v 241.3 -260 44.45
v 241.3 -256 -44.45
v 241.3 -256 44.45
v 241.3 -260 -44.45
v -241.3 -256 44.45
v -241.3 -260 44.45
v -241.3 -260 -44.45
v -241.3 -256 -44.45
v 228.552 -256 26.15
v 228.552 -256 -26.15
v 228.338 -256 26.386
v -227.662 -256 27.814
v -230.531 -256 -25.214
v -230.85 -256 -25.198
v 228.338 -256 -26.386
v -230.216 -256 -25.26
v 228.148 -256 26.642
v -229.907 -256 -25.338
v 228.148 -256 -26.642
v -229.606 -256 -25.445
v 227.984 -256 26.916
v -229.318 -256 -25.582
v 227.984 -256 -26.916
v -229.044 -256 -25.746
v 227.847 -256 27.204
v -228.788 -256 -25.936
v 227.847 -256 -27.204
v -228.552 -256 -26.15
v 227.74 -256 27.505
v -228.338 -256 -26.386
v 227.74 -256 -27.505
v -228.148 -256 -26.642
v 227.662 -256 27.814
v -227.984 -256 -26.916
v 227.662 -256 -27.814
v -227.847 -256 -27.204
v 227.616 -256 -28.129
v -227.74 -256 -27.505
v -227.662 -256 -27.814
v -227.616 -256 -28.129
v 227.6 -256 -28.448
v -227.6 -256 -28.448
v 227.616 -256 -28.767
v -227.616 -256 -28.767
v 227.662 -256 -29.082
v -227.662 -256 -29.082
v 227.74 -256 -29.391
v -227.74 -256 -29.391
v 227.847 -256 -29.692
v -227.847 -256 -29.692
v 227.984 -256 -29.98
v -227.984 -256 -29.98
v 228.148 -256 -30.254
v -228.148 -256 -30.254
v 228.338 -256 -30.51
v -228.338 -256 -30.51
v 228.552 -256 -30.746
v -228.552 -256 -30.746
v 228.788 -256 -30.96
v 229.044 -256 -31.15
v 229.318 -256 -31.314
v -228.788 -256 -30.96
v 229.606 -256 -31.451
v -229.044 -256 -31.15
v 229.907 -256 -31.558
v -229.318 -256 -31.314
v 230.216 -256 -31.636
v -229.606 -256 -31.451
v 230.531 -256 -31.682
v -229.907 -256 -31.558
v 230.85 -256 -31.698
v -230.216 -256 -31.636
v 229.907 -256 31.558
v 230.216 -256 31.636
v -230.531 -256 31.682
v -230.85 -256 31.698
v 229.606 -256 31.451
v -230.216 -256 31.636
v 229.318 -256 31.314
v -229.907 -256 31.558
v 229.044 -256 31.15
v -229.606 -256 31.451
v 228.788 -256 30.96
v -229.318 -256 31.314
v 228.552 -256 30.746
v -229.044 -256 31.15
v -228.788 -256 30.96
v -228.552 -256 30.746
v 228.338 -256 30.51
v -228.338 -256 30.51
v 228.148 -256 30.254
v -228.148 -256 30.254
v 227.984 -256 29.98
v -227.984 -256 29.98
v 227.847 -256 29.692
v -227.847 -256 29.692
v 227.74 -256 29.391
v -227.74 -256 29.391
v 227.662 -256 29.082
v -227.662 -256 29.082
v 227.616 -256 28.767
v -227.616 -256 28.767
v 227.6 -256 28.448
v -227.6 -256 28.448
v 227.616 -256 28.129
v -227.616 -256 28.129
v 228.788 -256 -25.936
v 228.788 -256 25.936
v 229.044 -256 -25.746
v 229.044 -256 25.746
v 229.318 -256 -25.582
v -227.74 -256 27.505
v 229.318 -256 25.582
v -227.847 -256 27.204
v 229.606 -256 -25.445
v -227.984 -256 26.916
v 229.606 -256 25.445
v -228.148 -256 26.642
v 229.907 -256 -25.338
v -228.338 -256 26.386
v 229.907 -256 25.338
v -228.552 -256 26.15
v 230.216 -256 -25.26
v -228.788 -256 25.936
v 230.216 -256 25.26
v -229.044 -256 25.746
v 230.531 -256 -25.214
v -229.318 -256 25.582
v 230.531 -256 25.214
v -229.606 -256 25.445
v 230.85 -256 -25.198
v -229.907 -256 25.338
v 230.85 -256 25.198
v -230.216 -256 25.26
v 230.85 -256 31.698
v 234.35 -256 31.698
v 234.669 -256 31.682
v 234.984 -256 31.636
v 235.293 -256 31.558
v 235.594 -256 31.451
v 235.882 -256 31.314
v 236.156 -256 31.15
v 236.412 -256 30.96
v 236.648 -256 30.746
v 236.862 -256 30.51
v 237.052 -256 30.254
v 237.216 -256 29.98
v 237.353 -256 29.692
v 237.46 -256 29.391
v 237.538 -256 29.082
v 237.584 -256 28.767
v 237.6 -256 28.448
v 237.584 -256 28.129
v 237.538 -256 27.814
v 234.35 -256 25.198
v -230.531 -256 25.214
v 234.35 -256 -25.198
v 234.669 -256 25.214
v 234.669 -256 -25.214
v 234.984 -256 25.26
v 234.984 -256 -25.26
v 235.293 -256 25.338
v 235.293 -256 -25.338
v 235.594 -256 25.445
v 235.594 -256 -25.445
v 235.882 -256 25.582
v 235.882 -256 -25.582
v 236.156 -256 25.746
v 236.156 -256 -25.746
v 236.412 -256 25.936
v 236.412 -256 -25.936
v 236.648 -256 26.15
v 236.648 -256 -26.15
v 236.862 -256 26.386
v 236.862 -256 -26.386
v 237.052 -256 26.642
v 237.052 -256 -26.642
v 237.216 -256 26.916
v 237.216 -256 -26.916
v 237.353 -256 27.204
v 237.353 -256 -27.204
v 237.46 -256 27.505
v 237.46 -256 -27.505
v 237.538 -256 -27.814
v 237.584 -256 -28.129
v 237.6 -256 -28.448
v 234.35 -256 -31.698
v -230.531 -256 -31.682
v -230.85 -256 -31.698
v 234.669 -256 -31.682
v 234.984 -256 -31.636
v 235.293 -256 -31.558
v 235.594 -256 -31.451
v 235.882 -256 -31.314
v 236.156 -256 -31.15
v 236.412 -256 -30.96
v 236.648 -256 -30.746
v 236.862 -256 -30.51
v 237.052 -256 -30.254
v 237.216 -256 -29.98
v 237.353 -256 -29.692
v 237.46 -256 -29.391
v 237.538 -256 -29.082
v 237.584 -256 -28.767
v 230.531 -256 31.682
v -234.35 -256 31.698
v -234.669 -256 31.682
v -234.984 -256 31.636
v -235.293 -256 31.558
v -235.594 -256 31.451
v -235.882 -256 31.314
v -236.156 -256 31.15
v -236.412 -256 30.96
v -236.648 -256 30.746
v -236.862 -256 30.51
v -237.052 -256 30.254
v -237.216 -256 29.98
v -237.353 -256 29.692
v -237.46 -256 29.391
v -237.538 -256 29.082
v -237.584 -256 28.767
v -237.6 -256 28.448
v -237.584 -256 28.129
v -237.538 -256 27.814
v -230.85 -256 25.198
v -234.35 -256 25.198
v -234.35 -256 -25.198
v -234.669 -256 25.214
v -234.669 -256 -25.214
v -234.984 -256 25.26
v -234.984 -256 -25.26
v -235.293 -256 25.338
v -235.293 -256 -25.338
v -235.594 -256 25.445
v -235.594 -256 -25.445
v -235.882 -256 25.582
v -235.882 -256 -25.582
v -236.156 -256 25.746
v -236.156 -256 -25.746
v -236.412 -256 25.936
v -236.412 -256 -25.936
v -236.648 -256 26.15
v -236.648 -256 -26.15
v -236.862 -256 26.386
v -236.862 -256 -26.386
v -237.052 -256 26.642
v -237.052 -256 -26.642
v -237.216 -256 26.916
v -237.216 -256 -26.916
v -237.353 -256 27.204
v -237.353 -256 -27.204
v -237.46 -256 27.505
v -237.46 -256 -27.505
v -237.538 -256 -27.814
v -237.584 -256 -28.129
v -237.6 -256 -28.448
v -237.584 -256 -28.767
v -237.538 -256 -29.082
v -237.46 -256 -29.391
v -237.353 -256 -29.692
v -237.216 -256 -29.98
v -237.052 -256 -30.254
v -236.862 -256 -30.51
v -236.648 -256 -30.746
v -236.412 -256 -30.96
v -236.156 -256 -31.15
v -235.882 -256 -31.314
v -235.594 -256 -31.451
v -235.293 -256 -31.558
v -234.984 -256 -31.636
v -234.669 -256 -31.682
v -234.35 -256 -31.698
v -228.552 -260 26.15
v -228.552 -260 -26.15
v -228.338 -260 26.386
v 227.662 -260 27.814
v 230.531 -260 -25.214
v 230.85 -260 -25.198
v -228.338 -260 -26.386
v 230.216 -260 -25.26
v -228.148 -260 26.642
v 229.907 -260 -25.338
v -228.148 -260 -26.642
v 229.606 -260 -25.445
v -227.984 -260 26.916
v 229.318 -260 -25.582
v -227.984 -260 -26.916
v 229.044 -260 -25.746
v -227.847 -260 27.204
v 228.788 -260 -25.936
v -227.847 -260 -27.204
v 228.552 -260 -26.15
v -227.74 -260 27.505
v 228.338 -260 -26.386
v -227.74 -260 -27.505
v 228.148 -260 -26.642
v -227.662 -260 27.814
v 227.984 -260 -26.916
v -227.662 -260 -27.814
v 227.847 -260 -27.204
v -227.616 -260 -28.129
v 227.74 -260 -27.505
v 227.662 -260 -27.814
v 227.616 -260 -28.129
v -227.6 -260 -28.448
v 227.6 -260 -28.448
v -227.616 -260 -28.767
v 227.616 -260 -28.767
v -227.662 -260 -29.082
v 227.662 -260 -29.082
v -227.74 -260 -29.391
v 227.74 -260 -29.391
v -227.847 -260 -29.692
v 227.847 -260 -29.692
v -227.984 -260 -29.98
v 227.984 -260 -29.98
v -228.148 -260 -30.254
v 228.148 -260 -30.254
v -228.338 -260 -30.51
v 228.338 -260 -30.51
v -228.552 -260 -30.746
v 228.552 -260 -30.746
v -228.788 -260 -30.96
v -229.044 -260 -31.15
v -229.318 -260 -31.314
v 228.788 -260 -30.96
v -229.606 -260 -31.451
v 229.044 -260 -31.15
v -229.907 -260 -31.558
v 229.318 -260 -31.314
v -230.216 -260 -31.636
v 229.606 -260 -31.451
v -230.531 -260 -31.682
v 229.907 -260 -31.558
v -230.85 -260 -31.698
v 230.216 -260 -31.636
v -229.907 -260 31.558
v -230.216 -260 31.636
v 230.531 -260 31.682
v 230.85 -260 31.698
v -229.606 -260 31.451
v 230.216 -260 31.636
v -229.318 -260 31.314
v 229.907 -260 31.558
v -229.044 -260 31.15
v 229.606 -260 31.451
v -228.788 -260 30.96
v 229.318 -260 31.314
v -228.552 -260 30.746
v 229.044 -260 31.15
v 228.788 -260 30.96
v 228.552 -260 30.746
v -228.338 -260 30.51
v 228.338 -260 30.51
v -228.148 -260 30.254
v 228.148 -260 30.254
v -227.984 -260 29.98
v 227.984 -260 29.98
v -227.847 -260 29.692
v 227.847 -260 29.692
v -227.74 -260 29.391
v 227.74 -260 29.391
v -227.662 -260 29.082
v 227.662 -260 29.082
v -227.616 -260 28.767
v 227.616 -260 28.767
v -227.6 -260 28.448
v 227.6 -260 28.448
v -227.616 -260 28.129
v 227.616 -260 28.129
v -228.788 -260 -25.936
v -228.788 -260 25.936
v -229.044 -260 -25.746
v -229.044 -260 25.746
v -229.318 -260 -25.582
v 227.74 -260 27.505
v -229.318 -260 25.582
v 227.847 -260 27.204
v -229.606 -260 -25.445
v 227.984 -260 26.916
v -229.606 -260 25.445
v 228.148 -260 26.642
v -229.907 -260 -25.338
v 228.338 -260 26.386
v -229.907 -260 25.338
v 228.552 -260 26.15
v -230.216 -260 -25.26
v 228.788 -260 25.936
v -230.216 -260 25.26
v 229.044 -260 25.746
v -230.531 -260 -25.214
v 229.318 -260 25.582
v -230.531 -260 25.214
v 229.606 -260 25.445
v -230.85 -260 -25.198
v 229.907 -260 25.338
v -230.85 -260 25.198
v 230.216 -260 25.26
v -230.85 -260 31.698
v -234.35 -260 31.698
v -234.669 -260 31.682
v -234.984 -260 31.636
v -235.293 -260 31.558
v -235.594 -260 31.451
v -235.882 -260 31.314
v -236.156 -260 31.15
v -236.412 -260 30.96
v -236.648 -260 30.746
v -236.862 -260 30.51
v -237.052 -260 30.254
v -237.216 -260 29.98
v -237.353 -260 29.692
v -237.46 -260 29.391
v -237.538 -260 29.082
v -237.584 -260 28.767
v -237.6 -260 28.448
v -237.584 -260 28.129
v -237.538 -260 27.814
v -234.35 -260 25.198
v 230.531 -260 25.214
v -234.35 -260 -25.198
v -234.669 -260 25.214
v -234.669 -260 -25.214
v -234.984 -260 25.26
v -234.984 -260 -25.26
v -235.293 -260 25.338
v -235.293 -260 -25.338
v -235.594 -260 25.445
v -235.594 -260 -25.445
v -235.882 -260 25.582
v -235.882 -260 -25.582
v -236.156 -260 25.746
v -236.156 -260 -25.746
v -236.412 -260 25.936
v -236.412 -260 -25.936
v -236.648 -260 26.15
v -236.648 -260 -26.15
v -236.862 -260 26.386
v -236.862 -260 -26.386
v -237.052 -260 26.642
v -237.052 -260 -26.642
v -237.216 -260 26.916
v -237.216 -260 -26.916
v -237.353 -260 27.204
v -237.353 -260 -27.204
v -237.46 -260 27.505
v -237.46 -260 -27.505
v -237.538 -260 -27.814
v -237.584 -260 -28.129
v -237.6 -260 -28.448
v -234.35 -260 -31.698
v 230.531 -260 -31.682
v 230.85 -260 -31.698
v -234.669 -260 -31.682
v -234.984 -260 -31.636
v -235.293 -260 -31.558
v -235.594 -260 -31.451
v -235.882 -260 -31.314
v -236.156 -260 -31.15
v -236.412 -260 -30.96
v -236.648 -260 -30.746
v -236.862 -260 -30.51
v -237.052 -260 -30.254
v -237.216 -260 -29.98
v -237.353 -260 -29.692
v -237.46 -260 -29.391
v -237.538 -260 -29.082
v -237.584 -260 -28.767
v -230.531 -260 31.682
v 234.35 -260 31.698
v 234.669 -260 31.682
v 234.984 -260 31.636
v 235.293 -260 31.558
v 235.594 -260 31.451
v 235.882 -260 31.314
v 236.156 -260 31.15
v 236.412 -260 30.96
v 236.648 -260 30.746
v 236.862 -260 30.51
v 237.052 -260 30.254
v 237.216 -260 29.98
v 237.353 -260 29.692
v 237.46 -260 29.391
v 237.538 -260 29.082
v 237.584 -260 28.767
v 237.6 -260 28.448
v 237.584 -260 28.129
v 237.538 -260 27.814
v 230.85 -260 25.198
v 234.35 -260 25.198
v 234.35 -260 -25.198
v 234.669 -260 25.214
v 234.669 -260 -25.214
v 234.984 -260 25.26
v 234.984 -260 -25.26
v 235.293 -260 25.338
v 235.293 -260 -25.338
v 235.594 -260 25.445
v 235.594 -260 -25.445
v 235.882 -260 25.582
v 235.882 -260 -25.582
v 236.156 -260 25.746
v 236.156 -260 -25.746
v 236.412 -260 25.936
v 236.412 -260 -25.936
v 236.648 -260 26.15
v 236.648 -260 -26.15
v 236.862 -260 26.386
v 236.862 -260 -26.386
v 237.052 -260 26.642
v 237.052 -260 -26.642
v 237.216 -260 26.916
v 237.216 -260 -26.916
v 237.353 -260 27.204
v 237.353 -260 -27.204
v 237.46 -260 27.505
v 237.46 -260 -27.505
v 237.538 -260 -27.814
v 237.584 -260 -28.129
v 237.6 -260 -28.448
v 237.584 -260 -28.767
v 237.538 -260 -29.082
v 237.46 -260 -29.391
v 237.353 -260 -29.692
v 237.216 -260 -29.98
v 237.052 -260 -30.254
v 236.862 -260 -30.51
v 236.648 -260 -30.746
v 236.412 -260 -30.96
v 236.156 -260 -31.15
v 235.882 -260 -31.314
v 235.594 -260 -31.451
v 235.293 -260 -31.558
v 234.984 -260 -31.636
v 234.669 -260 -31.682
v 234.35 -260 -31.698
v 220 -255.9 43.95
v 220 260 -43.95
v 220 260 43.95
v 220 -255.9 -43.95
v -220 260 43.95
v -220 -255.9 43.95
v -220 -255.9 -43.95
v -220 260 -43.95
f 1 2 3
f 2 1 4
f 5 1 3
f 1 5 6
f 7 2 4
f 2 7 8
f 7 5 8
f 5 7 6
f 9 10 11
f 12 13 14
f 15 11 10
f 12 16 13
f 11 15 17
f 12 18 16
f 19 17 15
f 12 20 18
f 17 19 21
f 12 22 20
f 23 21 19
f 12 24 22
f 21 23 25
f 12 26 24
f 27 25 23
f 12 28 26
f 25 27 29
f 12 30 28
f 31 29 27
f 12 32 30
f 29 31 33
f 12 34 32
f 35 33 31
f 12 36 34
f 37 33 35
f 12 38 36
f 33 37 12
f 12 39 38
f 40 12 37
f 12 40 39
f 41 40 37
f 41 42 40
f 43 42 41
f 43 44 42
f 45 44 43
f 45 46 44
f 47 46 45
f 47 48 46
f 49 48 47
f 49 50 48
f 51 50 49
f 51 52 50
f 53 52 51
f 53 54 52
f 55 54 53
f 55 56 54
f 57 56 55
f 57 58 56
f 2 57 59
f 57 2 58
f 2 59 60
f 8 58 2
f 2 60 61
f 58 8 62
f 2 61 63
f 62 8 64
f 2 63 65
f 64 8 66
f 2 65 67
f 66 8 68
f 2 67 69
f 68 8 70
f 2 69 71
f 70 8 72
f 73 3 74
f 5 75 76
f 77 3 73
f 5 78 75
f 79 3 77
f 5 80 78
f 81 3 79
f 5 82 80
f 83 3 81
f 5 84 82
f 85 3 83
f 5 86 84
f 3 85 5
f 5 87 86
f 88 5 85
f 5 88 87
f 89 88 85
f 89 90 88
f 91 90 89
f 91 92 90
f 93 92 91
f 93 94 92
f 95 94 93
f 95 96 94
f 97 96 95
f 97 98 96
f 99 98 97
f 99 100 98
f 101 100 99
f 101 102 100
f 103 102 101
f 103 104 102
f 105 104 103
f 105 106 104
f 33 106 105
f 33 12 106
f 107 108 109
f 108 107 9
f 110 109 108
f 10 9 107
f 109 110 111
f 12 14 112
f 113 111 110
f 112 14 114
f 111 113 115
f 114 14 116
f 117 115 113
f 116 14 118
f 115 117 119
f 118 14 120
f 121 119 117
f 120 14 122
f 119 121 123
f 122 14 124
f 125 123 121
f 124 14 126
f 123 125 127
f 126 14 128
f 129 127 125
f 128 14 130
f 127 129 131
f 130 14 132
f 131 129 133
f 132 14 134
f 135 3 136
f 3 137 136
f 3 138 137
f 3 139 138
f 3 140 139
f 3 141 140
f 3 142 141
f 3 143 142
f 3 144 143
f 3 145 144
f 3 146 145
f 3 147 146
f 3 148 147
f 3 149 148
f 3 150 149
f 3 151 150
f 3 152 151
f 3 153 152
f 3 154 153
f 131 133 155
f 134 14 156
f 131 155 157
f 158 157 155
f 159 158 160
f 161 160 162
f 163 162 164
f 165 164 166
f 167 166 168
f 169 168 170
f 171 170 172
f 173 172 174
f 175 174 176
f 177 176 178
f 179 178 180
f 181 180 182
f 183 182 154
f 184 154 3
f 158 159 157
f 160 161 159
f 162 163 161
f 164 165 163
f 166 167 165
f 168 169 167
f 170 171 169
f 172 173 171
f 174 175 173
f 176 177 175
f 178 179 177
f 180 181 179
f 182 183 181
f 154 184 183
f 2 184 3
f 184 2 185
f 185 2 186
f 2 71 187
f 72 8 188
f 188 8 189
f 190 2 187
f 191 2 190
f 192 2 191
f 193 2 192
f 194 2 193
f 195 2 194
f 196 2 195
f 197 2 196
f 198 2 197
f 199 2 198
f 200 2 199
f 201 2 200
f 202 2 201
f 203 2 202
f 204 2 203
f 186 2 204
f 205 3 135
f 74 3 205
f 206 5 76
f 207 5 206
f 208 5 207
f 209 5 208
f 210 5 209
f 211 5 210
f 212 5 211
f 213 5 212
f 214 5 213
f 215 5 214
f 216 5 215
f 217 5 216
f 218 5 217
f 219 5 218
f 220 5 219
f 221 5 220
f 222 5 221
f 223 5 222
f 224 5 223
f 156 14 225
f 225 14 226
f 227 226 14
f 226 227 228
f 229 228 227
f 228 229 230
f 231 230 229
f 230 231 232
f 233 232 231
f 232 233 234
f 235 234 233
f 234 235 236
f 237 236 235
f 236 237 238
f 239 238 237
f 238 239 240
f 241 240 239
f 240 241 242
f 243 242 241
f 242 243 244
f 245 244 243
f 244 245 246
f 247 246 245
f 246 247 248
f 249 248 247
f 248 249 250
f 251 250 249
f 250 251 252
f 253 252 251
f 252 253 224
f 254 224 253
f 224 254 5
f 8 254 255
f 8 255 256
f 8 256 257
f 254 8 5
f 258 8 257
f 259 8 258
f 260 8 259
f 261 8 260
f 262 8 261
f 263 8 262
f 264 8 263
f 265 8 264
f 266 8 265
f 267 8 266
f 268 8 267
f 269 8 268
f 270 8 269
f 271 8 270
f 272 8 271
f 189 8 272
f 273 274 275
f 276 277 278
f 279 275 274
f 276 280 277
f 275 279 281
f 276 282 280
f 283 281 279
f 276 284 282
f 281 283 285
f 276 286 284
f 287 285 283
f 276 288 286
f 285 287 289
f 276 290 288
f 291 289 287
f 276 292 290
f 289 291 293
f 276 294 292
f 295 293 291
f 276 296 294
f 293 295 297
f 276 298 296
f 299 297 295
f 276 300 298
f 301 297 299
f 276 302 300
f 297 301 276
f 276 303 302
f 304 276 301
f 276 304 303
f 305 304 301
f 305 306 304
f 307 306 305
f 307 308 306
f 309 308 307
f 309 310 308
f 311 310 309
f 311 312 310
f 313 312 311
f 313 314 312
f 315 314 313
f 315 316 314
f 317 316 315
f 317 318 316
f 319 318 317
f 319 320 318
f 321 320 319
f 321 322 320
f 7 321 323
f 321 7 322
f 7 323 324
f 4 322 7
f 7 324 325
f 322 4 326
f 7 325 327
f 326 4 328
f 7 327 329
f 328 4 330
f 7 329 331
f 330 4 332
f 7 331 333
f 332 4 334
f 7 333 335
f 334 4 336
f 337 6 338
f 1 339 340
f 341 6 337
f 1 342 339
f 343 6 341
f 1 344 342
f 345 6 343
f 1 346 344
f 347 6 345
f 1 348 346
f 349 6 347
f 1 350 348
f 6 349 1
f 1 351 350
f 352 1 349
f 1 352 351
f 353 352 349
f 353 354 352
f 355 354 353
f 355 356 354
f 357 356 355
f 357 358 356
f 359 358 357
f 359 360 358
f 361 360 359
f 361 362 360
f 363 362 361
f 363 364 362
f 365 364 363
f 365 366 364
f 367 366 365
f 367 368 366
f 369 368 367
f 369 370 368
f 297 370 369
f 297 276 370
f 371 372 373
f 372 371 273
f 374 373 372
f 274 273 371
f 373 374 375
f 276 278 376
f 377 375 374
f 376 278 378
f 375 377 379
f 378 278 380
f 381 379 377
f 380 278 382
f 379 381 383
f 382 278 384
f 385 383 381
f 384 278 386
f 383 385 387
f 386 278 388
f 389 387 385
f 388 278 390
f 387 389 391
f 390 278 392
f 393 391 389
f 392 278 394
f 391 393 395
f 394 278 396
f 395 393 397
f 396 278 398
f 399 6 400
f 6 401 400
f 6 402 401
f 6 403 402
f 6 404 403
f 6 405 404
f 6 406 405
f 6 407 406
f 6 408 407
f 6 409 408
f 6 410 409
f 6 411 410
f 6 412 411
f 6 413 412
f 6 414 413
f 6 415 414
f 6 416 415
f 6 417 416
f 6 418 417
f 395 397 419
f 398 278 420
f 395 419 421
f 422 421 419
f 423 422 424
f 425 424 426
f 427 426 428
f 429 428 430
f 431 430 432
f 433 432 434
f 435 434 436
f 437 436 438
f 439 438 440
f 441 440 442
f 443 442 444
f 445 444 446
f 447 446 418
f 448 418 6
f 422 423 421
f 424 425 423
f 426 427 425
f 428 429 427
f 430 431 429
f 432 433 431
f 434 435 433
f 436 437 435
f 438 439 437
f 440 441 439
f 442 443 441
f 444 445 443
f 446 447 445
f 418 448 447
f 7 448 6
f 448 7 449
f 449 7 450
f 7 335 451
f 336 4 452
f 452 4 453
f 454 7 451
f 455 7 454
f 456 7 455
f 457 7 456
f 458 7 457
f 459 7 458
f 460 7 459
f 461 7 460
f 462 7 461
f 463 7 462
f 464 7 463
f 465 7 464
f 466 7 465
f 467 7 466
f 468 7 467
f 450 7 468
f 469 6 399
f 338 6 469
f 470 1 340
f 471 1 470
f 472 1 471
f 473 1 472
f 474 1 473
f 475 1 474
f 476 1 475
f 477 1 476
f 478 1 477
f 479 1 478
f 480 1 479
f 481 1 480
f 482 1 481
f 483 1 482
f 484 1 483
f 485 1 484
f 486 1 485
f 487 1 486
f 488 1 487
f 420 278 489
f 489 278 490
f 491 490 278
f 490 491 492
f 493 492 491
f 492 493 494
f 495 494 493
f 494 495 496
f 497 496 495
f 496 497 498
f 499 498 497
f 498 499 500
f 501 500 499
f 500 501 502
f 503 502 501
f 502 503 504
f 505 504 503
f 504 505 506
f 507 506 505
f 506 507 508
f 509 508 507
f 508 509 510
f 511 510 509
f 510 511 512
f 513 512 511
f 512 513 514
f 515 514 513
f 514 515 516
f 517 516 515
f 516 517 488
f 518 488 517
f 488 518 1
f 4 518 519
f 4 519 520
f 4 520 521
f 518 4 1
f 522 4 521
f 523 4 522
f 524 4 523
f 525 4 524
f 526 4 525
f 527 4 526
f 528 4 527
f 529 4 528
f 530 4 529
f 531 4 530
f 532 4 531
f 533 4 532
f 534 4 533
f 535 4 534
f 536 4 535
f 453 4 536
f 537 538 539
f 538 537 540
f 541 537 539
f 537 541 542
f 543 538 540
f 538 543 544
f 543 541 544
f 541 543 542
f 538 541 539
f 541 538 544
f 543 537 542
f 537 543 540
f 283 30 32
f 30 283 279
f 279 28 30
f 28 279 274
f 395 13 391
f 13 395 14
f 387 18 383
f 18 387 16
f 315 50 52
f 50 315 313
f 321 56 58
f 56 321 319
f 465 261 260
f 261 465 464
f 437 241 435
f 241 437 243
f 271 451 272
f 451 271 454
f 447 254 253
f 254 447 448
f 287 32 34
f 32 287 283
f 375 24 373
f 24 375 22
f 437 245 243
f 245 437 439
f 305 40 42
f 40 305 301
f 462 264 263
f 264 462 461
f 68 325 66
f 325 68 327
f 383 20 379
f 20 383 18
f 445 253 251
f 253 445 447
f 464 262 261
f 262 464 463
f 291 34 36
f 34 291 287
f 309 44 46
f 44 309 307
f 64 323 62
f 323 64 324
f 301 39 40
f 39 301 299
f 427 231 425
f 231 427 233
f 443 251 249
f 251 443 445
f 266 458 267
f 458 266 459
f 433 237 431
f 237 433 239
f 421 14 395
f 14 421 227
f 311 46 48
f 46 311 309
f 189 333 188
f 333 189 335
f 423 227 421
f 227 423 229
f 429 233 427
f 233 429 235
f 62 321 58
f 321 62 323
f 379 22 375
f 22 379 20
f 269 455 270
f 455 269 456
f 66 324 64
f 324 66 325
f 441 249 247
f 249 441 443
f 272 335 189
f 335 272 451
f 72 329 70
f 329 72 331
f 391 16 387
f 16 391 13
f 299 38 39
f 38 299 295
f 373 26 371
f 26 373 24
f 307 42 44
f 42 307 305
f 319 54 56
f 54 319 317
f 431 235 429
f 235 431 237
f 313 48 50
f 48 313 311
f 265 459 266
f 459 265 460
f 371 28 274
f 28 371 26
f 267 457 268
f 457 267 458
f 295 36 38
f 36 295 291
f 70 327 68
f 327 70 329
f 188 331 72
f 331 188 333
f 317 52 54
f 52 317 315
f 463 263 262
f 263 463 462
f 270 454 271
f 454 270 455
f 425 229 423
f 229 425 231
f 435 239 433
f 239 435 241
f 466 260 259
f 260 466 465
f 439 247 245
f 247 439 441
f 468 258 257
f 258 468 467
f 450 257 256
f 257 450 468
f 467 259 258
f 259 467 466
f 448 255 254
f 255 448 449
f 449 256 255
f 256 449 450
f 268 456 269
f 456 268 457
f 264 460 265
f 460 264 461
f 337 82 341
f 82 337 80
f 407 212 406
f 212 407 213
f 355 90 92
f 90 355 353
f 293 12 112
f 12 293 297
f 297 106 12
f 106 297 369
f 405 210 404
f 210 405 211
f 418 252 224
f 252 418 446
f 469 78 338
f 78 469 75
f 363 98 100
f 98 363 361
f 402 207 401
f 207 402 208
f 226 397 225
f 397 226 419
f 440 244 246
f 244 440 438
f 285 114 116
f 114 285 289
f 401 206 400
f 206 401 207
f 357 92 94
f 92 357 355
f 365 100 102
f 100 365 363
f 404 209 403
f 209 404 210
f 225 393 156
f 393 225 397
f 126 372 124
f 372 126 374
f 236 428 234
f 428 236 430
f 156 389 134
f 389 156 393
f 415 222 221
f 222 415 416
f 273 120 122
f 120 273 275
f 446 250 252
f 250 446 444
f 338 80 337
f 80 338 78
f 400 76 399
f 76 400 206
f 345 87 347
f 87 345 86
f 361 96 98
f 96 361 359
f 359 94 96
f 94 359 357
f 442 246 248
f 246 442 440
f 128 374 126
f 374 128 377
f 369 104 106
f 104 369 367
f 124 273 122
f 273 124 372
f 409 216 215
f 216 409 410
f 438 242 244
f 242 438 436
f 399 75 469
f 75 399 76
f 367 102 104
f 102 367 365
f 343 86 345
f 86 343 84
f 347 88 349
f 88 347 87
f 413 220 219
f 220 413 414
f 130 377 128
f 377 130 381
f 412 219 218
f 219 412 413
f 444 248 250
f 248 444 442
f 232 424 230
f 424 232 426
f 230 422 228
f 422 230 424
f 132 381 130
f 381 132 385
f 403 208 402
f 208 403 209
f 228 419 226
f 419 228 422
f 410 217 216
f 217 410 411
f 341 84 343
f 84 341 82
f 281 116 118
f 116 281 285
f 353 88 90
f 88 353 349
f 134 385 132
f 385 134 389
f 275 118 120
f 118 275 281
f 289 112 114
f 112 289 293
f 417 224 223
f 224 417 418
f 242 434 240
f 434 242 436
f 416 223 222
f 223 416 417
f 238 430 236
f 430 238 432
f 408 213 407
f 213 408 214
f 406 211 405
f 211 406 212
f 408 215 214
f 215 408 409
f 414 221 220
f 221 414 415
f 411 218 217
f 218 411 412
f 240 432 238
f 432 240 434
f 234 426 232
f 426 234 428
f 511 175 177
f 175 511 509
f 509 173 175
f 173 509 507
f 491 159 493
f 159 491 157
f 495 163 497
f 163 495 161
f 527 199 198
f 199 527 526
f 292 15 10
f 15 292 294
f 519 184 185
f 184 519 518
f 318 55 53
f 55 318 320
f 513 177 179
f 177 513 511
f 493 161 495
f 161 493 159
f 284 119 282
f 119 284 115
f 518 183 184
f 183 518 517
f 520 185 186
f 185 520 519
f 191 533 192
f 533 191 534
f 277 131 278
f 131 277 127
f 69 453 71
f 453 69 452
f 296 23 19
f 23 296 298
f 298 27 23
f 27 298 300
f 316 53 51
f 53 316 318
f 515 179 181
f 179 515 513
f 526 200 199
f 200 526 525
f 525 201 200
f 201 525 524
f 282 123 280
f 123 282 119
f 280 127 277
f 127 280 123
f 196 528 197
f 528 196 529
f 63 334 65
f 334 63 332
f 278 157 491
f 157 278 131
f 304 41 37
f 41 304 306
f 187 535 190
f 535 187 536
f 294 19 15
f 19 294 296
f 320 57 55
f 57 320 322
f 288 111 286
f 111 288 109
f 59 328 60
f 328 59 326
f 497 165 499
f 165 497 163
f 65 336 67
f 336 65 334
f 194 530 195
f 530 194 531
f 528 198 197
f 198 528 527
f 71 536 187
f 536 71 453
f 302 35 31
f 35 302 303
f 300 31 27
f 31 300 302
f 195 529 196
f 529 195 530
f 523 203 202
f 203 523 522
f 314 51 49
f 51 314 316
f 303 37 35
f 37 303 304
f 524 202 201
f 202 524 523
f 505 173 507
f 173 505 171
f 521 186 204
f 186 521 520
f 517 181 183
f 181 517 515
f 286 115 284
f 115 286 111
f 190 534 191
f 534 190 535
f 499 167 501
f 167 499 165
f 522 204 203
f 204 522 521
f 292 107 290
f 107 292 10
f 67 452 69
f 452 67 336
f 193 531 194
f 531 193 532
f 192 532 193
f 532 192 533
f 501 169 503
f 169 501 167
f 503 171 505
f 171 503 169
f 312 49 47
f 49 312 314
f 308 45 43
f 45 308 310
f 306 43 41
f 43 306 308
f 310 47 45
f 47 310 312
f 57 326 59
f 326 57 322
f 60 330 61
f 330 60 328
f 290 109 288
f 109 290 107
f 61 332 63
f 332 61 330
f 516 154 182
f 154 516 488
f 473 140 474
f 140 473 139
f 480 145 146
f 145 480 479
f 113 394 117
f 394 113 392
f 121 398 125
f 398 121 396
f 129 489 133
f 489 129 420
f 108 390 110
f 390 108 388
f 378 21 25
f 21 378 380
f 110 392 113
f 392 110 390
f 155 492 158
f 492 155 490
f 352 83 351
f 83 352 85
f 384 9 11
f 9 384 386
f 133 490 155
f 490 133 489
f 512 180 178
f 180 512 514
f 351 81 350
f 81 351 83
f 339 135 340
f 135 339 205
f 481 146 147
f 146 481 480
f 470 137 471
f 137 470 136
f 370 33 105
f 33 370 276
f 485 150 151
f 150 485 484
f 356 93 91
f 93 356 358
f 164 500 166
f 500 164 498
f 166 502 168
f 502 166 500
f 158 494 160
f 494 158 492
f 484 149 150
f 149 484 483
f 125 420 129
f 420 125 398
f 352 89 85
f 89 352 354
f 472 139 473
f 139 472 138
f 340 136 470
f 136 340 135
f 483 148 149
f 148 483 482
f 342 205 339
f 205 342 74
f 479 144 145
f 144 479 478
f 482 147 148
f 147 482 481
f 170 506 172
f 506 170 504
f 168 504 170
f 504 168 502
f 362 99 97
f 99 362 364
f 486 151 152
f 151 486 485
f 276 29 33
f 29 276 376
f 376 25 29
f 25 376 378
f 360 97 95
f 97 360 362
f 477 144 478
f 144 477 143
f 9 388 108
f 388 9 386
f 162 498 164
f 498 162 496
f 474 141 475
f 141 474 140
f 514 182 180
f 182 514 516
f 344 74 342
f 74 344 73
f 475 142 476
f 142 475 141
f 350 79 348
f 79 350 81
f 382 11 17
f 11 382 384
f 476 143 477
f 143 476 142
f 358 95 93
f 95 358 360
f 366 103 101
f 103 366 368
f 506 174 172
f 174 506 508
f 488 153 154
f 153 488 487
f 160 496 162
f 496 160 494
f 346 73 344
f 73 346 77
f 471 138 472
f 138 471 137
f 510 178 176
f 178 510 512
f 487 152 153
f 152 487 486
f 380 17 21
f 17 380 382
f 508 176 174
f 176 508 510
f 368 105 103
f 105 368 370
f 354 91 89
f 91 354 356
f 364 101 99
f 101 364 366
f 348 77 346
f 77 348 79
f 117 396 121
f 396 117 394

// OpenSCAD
// ============================================================================
// Atom Lithography Machine — Parametric OpenSCAD Module (S6.11-01)
// ============================================================================
// part_id           : S6.11-01
// parent_bom_id     : S6.11
// subsystem         : S6
// part_name         : ZU48DR RFSoC Q16.16 BOED-FPGA 2U Raf Sasisi (2x Kart, 32 Direct-RF Zinciri, Exp140 S6.5-01, 11.50 kg)
// material          : Al 6061
// temp_stage        : 300 K (kabin)
// vacuum_grade      : Atmosfer
// tolerance         : 0.050 Hz RMS
// computed_mass_kg  : 11.62594
// envelope_mm       : 482.600 x 532.050 x 88.900
// design_maturity   : M0_M1_DETAILED_CAD_DESIGN_ONLY
// no_lab_measurement: true
// iec61508_certified: false
// semi_s2_certified : false
// Units: millimeters (mm)
// ============================================================================

$fn = 64;

// Nominal bounding envelope parameters (mm)
bbox_x = 482.6000;
bbox_y = 532.0500;
bbox_z = 88.9000;

// Part-specific parametric dimensions
rack_u = 2;
u_start = 22;
rf_chains = 32;
power_w = 87.96;
mass_kg = 11.5;

// Interface / port parameters (mm)

module part_S6_11_01() {
  difference() {
    union() {
      // 19" EIA-310 front bezel panel
      translate([0.000, -258.000, 0.000]) cube([482.600, 4.000, 88.900], center=true);
      // Hollow EMI shielded chassis body
      translate([0.000, 2.050, 0.000]) cube([440.000, 515.900, 87.900], center=true);
    }
    // EIA-310 rack ear slot
    translate([-232.600, -258.000, -28.448]) rotate([90.000, 0.000, 0.000]) {
      hull() {
        translate([-1.750, 0, 0]) cylinder(d=6.500, h=6.000, center=true);
        translate([1.750, 0, 0]) cylinder(d=6.500, h=6.000, center=true);
      }
    }
    // EIA-310 rack ear slot
    translate([-232.600, -258.000, 28.448]) rotate([90.000, 0.000, 0.000]) {
      hull() {
        translate([-1.750, 0, 0]) cylinder(d=6.500, h=6.000, center=true);
        translate([1.750, 0, 0]) cylinder(d=6.500, h=6.000, center=true);
      }
    }
    // EIA-310 rack ear slot
    translate([232.600, -258.000, -28.448]) rotate([90.000, 0.000, 0.000]) {
      hull() {
        translate([-1.750, 0, 0]) cylinder(d=6.500, h=6.000, center=true);
        translate([1.750, 0, 0]) cylinder(d=6.500, h=6.000, center=true);
      }
    }
    // EIA-310 rack ear slot
    translate([232.600, -258.000, 28.448]) rotate([90.000, 0.000, 0.000]) {
      hull() {
        translate([-1.750, 0, 0]) cylinder(d=6.500, h=6.000, center=true);
        translate([1.750, 0, 0]) cylinder(d=6.500, h=6.000, center=true);
      }
    }
  }
}

// World assembly mounting transform (global machine frame, mm / deg):
// translate([2100.000, 0.000, 1069.000]) rotate([0.000, 0.000, 0.000]) part_S6_11_01();

part_S6_11_01();
